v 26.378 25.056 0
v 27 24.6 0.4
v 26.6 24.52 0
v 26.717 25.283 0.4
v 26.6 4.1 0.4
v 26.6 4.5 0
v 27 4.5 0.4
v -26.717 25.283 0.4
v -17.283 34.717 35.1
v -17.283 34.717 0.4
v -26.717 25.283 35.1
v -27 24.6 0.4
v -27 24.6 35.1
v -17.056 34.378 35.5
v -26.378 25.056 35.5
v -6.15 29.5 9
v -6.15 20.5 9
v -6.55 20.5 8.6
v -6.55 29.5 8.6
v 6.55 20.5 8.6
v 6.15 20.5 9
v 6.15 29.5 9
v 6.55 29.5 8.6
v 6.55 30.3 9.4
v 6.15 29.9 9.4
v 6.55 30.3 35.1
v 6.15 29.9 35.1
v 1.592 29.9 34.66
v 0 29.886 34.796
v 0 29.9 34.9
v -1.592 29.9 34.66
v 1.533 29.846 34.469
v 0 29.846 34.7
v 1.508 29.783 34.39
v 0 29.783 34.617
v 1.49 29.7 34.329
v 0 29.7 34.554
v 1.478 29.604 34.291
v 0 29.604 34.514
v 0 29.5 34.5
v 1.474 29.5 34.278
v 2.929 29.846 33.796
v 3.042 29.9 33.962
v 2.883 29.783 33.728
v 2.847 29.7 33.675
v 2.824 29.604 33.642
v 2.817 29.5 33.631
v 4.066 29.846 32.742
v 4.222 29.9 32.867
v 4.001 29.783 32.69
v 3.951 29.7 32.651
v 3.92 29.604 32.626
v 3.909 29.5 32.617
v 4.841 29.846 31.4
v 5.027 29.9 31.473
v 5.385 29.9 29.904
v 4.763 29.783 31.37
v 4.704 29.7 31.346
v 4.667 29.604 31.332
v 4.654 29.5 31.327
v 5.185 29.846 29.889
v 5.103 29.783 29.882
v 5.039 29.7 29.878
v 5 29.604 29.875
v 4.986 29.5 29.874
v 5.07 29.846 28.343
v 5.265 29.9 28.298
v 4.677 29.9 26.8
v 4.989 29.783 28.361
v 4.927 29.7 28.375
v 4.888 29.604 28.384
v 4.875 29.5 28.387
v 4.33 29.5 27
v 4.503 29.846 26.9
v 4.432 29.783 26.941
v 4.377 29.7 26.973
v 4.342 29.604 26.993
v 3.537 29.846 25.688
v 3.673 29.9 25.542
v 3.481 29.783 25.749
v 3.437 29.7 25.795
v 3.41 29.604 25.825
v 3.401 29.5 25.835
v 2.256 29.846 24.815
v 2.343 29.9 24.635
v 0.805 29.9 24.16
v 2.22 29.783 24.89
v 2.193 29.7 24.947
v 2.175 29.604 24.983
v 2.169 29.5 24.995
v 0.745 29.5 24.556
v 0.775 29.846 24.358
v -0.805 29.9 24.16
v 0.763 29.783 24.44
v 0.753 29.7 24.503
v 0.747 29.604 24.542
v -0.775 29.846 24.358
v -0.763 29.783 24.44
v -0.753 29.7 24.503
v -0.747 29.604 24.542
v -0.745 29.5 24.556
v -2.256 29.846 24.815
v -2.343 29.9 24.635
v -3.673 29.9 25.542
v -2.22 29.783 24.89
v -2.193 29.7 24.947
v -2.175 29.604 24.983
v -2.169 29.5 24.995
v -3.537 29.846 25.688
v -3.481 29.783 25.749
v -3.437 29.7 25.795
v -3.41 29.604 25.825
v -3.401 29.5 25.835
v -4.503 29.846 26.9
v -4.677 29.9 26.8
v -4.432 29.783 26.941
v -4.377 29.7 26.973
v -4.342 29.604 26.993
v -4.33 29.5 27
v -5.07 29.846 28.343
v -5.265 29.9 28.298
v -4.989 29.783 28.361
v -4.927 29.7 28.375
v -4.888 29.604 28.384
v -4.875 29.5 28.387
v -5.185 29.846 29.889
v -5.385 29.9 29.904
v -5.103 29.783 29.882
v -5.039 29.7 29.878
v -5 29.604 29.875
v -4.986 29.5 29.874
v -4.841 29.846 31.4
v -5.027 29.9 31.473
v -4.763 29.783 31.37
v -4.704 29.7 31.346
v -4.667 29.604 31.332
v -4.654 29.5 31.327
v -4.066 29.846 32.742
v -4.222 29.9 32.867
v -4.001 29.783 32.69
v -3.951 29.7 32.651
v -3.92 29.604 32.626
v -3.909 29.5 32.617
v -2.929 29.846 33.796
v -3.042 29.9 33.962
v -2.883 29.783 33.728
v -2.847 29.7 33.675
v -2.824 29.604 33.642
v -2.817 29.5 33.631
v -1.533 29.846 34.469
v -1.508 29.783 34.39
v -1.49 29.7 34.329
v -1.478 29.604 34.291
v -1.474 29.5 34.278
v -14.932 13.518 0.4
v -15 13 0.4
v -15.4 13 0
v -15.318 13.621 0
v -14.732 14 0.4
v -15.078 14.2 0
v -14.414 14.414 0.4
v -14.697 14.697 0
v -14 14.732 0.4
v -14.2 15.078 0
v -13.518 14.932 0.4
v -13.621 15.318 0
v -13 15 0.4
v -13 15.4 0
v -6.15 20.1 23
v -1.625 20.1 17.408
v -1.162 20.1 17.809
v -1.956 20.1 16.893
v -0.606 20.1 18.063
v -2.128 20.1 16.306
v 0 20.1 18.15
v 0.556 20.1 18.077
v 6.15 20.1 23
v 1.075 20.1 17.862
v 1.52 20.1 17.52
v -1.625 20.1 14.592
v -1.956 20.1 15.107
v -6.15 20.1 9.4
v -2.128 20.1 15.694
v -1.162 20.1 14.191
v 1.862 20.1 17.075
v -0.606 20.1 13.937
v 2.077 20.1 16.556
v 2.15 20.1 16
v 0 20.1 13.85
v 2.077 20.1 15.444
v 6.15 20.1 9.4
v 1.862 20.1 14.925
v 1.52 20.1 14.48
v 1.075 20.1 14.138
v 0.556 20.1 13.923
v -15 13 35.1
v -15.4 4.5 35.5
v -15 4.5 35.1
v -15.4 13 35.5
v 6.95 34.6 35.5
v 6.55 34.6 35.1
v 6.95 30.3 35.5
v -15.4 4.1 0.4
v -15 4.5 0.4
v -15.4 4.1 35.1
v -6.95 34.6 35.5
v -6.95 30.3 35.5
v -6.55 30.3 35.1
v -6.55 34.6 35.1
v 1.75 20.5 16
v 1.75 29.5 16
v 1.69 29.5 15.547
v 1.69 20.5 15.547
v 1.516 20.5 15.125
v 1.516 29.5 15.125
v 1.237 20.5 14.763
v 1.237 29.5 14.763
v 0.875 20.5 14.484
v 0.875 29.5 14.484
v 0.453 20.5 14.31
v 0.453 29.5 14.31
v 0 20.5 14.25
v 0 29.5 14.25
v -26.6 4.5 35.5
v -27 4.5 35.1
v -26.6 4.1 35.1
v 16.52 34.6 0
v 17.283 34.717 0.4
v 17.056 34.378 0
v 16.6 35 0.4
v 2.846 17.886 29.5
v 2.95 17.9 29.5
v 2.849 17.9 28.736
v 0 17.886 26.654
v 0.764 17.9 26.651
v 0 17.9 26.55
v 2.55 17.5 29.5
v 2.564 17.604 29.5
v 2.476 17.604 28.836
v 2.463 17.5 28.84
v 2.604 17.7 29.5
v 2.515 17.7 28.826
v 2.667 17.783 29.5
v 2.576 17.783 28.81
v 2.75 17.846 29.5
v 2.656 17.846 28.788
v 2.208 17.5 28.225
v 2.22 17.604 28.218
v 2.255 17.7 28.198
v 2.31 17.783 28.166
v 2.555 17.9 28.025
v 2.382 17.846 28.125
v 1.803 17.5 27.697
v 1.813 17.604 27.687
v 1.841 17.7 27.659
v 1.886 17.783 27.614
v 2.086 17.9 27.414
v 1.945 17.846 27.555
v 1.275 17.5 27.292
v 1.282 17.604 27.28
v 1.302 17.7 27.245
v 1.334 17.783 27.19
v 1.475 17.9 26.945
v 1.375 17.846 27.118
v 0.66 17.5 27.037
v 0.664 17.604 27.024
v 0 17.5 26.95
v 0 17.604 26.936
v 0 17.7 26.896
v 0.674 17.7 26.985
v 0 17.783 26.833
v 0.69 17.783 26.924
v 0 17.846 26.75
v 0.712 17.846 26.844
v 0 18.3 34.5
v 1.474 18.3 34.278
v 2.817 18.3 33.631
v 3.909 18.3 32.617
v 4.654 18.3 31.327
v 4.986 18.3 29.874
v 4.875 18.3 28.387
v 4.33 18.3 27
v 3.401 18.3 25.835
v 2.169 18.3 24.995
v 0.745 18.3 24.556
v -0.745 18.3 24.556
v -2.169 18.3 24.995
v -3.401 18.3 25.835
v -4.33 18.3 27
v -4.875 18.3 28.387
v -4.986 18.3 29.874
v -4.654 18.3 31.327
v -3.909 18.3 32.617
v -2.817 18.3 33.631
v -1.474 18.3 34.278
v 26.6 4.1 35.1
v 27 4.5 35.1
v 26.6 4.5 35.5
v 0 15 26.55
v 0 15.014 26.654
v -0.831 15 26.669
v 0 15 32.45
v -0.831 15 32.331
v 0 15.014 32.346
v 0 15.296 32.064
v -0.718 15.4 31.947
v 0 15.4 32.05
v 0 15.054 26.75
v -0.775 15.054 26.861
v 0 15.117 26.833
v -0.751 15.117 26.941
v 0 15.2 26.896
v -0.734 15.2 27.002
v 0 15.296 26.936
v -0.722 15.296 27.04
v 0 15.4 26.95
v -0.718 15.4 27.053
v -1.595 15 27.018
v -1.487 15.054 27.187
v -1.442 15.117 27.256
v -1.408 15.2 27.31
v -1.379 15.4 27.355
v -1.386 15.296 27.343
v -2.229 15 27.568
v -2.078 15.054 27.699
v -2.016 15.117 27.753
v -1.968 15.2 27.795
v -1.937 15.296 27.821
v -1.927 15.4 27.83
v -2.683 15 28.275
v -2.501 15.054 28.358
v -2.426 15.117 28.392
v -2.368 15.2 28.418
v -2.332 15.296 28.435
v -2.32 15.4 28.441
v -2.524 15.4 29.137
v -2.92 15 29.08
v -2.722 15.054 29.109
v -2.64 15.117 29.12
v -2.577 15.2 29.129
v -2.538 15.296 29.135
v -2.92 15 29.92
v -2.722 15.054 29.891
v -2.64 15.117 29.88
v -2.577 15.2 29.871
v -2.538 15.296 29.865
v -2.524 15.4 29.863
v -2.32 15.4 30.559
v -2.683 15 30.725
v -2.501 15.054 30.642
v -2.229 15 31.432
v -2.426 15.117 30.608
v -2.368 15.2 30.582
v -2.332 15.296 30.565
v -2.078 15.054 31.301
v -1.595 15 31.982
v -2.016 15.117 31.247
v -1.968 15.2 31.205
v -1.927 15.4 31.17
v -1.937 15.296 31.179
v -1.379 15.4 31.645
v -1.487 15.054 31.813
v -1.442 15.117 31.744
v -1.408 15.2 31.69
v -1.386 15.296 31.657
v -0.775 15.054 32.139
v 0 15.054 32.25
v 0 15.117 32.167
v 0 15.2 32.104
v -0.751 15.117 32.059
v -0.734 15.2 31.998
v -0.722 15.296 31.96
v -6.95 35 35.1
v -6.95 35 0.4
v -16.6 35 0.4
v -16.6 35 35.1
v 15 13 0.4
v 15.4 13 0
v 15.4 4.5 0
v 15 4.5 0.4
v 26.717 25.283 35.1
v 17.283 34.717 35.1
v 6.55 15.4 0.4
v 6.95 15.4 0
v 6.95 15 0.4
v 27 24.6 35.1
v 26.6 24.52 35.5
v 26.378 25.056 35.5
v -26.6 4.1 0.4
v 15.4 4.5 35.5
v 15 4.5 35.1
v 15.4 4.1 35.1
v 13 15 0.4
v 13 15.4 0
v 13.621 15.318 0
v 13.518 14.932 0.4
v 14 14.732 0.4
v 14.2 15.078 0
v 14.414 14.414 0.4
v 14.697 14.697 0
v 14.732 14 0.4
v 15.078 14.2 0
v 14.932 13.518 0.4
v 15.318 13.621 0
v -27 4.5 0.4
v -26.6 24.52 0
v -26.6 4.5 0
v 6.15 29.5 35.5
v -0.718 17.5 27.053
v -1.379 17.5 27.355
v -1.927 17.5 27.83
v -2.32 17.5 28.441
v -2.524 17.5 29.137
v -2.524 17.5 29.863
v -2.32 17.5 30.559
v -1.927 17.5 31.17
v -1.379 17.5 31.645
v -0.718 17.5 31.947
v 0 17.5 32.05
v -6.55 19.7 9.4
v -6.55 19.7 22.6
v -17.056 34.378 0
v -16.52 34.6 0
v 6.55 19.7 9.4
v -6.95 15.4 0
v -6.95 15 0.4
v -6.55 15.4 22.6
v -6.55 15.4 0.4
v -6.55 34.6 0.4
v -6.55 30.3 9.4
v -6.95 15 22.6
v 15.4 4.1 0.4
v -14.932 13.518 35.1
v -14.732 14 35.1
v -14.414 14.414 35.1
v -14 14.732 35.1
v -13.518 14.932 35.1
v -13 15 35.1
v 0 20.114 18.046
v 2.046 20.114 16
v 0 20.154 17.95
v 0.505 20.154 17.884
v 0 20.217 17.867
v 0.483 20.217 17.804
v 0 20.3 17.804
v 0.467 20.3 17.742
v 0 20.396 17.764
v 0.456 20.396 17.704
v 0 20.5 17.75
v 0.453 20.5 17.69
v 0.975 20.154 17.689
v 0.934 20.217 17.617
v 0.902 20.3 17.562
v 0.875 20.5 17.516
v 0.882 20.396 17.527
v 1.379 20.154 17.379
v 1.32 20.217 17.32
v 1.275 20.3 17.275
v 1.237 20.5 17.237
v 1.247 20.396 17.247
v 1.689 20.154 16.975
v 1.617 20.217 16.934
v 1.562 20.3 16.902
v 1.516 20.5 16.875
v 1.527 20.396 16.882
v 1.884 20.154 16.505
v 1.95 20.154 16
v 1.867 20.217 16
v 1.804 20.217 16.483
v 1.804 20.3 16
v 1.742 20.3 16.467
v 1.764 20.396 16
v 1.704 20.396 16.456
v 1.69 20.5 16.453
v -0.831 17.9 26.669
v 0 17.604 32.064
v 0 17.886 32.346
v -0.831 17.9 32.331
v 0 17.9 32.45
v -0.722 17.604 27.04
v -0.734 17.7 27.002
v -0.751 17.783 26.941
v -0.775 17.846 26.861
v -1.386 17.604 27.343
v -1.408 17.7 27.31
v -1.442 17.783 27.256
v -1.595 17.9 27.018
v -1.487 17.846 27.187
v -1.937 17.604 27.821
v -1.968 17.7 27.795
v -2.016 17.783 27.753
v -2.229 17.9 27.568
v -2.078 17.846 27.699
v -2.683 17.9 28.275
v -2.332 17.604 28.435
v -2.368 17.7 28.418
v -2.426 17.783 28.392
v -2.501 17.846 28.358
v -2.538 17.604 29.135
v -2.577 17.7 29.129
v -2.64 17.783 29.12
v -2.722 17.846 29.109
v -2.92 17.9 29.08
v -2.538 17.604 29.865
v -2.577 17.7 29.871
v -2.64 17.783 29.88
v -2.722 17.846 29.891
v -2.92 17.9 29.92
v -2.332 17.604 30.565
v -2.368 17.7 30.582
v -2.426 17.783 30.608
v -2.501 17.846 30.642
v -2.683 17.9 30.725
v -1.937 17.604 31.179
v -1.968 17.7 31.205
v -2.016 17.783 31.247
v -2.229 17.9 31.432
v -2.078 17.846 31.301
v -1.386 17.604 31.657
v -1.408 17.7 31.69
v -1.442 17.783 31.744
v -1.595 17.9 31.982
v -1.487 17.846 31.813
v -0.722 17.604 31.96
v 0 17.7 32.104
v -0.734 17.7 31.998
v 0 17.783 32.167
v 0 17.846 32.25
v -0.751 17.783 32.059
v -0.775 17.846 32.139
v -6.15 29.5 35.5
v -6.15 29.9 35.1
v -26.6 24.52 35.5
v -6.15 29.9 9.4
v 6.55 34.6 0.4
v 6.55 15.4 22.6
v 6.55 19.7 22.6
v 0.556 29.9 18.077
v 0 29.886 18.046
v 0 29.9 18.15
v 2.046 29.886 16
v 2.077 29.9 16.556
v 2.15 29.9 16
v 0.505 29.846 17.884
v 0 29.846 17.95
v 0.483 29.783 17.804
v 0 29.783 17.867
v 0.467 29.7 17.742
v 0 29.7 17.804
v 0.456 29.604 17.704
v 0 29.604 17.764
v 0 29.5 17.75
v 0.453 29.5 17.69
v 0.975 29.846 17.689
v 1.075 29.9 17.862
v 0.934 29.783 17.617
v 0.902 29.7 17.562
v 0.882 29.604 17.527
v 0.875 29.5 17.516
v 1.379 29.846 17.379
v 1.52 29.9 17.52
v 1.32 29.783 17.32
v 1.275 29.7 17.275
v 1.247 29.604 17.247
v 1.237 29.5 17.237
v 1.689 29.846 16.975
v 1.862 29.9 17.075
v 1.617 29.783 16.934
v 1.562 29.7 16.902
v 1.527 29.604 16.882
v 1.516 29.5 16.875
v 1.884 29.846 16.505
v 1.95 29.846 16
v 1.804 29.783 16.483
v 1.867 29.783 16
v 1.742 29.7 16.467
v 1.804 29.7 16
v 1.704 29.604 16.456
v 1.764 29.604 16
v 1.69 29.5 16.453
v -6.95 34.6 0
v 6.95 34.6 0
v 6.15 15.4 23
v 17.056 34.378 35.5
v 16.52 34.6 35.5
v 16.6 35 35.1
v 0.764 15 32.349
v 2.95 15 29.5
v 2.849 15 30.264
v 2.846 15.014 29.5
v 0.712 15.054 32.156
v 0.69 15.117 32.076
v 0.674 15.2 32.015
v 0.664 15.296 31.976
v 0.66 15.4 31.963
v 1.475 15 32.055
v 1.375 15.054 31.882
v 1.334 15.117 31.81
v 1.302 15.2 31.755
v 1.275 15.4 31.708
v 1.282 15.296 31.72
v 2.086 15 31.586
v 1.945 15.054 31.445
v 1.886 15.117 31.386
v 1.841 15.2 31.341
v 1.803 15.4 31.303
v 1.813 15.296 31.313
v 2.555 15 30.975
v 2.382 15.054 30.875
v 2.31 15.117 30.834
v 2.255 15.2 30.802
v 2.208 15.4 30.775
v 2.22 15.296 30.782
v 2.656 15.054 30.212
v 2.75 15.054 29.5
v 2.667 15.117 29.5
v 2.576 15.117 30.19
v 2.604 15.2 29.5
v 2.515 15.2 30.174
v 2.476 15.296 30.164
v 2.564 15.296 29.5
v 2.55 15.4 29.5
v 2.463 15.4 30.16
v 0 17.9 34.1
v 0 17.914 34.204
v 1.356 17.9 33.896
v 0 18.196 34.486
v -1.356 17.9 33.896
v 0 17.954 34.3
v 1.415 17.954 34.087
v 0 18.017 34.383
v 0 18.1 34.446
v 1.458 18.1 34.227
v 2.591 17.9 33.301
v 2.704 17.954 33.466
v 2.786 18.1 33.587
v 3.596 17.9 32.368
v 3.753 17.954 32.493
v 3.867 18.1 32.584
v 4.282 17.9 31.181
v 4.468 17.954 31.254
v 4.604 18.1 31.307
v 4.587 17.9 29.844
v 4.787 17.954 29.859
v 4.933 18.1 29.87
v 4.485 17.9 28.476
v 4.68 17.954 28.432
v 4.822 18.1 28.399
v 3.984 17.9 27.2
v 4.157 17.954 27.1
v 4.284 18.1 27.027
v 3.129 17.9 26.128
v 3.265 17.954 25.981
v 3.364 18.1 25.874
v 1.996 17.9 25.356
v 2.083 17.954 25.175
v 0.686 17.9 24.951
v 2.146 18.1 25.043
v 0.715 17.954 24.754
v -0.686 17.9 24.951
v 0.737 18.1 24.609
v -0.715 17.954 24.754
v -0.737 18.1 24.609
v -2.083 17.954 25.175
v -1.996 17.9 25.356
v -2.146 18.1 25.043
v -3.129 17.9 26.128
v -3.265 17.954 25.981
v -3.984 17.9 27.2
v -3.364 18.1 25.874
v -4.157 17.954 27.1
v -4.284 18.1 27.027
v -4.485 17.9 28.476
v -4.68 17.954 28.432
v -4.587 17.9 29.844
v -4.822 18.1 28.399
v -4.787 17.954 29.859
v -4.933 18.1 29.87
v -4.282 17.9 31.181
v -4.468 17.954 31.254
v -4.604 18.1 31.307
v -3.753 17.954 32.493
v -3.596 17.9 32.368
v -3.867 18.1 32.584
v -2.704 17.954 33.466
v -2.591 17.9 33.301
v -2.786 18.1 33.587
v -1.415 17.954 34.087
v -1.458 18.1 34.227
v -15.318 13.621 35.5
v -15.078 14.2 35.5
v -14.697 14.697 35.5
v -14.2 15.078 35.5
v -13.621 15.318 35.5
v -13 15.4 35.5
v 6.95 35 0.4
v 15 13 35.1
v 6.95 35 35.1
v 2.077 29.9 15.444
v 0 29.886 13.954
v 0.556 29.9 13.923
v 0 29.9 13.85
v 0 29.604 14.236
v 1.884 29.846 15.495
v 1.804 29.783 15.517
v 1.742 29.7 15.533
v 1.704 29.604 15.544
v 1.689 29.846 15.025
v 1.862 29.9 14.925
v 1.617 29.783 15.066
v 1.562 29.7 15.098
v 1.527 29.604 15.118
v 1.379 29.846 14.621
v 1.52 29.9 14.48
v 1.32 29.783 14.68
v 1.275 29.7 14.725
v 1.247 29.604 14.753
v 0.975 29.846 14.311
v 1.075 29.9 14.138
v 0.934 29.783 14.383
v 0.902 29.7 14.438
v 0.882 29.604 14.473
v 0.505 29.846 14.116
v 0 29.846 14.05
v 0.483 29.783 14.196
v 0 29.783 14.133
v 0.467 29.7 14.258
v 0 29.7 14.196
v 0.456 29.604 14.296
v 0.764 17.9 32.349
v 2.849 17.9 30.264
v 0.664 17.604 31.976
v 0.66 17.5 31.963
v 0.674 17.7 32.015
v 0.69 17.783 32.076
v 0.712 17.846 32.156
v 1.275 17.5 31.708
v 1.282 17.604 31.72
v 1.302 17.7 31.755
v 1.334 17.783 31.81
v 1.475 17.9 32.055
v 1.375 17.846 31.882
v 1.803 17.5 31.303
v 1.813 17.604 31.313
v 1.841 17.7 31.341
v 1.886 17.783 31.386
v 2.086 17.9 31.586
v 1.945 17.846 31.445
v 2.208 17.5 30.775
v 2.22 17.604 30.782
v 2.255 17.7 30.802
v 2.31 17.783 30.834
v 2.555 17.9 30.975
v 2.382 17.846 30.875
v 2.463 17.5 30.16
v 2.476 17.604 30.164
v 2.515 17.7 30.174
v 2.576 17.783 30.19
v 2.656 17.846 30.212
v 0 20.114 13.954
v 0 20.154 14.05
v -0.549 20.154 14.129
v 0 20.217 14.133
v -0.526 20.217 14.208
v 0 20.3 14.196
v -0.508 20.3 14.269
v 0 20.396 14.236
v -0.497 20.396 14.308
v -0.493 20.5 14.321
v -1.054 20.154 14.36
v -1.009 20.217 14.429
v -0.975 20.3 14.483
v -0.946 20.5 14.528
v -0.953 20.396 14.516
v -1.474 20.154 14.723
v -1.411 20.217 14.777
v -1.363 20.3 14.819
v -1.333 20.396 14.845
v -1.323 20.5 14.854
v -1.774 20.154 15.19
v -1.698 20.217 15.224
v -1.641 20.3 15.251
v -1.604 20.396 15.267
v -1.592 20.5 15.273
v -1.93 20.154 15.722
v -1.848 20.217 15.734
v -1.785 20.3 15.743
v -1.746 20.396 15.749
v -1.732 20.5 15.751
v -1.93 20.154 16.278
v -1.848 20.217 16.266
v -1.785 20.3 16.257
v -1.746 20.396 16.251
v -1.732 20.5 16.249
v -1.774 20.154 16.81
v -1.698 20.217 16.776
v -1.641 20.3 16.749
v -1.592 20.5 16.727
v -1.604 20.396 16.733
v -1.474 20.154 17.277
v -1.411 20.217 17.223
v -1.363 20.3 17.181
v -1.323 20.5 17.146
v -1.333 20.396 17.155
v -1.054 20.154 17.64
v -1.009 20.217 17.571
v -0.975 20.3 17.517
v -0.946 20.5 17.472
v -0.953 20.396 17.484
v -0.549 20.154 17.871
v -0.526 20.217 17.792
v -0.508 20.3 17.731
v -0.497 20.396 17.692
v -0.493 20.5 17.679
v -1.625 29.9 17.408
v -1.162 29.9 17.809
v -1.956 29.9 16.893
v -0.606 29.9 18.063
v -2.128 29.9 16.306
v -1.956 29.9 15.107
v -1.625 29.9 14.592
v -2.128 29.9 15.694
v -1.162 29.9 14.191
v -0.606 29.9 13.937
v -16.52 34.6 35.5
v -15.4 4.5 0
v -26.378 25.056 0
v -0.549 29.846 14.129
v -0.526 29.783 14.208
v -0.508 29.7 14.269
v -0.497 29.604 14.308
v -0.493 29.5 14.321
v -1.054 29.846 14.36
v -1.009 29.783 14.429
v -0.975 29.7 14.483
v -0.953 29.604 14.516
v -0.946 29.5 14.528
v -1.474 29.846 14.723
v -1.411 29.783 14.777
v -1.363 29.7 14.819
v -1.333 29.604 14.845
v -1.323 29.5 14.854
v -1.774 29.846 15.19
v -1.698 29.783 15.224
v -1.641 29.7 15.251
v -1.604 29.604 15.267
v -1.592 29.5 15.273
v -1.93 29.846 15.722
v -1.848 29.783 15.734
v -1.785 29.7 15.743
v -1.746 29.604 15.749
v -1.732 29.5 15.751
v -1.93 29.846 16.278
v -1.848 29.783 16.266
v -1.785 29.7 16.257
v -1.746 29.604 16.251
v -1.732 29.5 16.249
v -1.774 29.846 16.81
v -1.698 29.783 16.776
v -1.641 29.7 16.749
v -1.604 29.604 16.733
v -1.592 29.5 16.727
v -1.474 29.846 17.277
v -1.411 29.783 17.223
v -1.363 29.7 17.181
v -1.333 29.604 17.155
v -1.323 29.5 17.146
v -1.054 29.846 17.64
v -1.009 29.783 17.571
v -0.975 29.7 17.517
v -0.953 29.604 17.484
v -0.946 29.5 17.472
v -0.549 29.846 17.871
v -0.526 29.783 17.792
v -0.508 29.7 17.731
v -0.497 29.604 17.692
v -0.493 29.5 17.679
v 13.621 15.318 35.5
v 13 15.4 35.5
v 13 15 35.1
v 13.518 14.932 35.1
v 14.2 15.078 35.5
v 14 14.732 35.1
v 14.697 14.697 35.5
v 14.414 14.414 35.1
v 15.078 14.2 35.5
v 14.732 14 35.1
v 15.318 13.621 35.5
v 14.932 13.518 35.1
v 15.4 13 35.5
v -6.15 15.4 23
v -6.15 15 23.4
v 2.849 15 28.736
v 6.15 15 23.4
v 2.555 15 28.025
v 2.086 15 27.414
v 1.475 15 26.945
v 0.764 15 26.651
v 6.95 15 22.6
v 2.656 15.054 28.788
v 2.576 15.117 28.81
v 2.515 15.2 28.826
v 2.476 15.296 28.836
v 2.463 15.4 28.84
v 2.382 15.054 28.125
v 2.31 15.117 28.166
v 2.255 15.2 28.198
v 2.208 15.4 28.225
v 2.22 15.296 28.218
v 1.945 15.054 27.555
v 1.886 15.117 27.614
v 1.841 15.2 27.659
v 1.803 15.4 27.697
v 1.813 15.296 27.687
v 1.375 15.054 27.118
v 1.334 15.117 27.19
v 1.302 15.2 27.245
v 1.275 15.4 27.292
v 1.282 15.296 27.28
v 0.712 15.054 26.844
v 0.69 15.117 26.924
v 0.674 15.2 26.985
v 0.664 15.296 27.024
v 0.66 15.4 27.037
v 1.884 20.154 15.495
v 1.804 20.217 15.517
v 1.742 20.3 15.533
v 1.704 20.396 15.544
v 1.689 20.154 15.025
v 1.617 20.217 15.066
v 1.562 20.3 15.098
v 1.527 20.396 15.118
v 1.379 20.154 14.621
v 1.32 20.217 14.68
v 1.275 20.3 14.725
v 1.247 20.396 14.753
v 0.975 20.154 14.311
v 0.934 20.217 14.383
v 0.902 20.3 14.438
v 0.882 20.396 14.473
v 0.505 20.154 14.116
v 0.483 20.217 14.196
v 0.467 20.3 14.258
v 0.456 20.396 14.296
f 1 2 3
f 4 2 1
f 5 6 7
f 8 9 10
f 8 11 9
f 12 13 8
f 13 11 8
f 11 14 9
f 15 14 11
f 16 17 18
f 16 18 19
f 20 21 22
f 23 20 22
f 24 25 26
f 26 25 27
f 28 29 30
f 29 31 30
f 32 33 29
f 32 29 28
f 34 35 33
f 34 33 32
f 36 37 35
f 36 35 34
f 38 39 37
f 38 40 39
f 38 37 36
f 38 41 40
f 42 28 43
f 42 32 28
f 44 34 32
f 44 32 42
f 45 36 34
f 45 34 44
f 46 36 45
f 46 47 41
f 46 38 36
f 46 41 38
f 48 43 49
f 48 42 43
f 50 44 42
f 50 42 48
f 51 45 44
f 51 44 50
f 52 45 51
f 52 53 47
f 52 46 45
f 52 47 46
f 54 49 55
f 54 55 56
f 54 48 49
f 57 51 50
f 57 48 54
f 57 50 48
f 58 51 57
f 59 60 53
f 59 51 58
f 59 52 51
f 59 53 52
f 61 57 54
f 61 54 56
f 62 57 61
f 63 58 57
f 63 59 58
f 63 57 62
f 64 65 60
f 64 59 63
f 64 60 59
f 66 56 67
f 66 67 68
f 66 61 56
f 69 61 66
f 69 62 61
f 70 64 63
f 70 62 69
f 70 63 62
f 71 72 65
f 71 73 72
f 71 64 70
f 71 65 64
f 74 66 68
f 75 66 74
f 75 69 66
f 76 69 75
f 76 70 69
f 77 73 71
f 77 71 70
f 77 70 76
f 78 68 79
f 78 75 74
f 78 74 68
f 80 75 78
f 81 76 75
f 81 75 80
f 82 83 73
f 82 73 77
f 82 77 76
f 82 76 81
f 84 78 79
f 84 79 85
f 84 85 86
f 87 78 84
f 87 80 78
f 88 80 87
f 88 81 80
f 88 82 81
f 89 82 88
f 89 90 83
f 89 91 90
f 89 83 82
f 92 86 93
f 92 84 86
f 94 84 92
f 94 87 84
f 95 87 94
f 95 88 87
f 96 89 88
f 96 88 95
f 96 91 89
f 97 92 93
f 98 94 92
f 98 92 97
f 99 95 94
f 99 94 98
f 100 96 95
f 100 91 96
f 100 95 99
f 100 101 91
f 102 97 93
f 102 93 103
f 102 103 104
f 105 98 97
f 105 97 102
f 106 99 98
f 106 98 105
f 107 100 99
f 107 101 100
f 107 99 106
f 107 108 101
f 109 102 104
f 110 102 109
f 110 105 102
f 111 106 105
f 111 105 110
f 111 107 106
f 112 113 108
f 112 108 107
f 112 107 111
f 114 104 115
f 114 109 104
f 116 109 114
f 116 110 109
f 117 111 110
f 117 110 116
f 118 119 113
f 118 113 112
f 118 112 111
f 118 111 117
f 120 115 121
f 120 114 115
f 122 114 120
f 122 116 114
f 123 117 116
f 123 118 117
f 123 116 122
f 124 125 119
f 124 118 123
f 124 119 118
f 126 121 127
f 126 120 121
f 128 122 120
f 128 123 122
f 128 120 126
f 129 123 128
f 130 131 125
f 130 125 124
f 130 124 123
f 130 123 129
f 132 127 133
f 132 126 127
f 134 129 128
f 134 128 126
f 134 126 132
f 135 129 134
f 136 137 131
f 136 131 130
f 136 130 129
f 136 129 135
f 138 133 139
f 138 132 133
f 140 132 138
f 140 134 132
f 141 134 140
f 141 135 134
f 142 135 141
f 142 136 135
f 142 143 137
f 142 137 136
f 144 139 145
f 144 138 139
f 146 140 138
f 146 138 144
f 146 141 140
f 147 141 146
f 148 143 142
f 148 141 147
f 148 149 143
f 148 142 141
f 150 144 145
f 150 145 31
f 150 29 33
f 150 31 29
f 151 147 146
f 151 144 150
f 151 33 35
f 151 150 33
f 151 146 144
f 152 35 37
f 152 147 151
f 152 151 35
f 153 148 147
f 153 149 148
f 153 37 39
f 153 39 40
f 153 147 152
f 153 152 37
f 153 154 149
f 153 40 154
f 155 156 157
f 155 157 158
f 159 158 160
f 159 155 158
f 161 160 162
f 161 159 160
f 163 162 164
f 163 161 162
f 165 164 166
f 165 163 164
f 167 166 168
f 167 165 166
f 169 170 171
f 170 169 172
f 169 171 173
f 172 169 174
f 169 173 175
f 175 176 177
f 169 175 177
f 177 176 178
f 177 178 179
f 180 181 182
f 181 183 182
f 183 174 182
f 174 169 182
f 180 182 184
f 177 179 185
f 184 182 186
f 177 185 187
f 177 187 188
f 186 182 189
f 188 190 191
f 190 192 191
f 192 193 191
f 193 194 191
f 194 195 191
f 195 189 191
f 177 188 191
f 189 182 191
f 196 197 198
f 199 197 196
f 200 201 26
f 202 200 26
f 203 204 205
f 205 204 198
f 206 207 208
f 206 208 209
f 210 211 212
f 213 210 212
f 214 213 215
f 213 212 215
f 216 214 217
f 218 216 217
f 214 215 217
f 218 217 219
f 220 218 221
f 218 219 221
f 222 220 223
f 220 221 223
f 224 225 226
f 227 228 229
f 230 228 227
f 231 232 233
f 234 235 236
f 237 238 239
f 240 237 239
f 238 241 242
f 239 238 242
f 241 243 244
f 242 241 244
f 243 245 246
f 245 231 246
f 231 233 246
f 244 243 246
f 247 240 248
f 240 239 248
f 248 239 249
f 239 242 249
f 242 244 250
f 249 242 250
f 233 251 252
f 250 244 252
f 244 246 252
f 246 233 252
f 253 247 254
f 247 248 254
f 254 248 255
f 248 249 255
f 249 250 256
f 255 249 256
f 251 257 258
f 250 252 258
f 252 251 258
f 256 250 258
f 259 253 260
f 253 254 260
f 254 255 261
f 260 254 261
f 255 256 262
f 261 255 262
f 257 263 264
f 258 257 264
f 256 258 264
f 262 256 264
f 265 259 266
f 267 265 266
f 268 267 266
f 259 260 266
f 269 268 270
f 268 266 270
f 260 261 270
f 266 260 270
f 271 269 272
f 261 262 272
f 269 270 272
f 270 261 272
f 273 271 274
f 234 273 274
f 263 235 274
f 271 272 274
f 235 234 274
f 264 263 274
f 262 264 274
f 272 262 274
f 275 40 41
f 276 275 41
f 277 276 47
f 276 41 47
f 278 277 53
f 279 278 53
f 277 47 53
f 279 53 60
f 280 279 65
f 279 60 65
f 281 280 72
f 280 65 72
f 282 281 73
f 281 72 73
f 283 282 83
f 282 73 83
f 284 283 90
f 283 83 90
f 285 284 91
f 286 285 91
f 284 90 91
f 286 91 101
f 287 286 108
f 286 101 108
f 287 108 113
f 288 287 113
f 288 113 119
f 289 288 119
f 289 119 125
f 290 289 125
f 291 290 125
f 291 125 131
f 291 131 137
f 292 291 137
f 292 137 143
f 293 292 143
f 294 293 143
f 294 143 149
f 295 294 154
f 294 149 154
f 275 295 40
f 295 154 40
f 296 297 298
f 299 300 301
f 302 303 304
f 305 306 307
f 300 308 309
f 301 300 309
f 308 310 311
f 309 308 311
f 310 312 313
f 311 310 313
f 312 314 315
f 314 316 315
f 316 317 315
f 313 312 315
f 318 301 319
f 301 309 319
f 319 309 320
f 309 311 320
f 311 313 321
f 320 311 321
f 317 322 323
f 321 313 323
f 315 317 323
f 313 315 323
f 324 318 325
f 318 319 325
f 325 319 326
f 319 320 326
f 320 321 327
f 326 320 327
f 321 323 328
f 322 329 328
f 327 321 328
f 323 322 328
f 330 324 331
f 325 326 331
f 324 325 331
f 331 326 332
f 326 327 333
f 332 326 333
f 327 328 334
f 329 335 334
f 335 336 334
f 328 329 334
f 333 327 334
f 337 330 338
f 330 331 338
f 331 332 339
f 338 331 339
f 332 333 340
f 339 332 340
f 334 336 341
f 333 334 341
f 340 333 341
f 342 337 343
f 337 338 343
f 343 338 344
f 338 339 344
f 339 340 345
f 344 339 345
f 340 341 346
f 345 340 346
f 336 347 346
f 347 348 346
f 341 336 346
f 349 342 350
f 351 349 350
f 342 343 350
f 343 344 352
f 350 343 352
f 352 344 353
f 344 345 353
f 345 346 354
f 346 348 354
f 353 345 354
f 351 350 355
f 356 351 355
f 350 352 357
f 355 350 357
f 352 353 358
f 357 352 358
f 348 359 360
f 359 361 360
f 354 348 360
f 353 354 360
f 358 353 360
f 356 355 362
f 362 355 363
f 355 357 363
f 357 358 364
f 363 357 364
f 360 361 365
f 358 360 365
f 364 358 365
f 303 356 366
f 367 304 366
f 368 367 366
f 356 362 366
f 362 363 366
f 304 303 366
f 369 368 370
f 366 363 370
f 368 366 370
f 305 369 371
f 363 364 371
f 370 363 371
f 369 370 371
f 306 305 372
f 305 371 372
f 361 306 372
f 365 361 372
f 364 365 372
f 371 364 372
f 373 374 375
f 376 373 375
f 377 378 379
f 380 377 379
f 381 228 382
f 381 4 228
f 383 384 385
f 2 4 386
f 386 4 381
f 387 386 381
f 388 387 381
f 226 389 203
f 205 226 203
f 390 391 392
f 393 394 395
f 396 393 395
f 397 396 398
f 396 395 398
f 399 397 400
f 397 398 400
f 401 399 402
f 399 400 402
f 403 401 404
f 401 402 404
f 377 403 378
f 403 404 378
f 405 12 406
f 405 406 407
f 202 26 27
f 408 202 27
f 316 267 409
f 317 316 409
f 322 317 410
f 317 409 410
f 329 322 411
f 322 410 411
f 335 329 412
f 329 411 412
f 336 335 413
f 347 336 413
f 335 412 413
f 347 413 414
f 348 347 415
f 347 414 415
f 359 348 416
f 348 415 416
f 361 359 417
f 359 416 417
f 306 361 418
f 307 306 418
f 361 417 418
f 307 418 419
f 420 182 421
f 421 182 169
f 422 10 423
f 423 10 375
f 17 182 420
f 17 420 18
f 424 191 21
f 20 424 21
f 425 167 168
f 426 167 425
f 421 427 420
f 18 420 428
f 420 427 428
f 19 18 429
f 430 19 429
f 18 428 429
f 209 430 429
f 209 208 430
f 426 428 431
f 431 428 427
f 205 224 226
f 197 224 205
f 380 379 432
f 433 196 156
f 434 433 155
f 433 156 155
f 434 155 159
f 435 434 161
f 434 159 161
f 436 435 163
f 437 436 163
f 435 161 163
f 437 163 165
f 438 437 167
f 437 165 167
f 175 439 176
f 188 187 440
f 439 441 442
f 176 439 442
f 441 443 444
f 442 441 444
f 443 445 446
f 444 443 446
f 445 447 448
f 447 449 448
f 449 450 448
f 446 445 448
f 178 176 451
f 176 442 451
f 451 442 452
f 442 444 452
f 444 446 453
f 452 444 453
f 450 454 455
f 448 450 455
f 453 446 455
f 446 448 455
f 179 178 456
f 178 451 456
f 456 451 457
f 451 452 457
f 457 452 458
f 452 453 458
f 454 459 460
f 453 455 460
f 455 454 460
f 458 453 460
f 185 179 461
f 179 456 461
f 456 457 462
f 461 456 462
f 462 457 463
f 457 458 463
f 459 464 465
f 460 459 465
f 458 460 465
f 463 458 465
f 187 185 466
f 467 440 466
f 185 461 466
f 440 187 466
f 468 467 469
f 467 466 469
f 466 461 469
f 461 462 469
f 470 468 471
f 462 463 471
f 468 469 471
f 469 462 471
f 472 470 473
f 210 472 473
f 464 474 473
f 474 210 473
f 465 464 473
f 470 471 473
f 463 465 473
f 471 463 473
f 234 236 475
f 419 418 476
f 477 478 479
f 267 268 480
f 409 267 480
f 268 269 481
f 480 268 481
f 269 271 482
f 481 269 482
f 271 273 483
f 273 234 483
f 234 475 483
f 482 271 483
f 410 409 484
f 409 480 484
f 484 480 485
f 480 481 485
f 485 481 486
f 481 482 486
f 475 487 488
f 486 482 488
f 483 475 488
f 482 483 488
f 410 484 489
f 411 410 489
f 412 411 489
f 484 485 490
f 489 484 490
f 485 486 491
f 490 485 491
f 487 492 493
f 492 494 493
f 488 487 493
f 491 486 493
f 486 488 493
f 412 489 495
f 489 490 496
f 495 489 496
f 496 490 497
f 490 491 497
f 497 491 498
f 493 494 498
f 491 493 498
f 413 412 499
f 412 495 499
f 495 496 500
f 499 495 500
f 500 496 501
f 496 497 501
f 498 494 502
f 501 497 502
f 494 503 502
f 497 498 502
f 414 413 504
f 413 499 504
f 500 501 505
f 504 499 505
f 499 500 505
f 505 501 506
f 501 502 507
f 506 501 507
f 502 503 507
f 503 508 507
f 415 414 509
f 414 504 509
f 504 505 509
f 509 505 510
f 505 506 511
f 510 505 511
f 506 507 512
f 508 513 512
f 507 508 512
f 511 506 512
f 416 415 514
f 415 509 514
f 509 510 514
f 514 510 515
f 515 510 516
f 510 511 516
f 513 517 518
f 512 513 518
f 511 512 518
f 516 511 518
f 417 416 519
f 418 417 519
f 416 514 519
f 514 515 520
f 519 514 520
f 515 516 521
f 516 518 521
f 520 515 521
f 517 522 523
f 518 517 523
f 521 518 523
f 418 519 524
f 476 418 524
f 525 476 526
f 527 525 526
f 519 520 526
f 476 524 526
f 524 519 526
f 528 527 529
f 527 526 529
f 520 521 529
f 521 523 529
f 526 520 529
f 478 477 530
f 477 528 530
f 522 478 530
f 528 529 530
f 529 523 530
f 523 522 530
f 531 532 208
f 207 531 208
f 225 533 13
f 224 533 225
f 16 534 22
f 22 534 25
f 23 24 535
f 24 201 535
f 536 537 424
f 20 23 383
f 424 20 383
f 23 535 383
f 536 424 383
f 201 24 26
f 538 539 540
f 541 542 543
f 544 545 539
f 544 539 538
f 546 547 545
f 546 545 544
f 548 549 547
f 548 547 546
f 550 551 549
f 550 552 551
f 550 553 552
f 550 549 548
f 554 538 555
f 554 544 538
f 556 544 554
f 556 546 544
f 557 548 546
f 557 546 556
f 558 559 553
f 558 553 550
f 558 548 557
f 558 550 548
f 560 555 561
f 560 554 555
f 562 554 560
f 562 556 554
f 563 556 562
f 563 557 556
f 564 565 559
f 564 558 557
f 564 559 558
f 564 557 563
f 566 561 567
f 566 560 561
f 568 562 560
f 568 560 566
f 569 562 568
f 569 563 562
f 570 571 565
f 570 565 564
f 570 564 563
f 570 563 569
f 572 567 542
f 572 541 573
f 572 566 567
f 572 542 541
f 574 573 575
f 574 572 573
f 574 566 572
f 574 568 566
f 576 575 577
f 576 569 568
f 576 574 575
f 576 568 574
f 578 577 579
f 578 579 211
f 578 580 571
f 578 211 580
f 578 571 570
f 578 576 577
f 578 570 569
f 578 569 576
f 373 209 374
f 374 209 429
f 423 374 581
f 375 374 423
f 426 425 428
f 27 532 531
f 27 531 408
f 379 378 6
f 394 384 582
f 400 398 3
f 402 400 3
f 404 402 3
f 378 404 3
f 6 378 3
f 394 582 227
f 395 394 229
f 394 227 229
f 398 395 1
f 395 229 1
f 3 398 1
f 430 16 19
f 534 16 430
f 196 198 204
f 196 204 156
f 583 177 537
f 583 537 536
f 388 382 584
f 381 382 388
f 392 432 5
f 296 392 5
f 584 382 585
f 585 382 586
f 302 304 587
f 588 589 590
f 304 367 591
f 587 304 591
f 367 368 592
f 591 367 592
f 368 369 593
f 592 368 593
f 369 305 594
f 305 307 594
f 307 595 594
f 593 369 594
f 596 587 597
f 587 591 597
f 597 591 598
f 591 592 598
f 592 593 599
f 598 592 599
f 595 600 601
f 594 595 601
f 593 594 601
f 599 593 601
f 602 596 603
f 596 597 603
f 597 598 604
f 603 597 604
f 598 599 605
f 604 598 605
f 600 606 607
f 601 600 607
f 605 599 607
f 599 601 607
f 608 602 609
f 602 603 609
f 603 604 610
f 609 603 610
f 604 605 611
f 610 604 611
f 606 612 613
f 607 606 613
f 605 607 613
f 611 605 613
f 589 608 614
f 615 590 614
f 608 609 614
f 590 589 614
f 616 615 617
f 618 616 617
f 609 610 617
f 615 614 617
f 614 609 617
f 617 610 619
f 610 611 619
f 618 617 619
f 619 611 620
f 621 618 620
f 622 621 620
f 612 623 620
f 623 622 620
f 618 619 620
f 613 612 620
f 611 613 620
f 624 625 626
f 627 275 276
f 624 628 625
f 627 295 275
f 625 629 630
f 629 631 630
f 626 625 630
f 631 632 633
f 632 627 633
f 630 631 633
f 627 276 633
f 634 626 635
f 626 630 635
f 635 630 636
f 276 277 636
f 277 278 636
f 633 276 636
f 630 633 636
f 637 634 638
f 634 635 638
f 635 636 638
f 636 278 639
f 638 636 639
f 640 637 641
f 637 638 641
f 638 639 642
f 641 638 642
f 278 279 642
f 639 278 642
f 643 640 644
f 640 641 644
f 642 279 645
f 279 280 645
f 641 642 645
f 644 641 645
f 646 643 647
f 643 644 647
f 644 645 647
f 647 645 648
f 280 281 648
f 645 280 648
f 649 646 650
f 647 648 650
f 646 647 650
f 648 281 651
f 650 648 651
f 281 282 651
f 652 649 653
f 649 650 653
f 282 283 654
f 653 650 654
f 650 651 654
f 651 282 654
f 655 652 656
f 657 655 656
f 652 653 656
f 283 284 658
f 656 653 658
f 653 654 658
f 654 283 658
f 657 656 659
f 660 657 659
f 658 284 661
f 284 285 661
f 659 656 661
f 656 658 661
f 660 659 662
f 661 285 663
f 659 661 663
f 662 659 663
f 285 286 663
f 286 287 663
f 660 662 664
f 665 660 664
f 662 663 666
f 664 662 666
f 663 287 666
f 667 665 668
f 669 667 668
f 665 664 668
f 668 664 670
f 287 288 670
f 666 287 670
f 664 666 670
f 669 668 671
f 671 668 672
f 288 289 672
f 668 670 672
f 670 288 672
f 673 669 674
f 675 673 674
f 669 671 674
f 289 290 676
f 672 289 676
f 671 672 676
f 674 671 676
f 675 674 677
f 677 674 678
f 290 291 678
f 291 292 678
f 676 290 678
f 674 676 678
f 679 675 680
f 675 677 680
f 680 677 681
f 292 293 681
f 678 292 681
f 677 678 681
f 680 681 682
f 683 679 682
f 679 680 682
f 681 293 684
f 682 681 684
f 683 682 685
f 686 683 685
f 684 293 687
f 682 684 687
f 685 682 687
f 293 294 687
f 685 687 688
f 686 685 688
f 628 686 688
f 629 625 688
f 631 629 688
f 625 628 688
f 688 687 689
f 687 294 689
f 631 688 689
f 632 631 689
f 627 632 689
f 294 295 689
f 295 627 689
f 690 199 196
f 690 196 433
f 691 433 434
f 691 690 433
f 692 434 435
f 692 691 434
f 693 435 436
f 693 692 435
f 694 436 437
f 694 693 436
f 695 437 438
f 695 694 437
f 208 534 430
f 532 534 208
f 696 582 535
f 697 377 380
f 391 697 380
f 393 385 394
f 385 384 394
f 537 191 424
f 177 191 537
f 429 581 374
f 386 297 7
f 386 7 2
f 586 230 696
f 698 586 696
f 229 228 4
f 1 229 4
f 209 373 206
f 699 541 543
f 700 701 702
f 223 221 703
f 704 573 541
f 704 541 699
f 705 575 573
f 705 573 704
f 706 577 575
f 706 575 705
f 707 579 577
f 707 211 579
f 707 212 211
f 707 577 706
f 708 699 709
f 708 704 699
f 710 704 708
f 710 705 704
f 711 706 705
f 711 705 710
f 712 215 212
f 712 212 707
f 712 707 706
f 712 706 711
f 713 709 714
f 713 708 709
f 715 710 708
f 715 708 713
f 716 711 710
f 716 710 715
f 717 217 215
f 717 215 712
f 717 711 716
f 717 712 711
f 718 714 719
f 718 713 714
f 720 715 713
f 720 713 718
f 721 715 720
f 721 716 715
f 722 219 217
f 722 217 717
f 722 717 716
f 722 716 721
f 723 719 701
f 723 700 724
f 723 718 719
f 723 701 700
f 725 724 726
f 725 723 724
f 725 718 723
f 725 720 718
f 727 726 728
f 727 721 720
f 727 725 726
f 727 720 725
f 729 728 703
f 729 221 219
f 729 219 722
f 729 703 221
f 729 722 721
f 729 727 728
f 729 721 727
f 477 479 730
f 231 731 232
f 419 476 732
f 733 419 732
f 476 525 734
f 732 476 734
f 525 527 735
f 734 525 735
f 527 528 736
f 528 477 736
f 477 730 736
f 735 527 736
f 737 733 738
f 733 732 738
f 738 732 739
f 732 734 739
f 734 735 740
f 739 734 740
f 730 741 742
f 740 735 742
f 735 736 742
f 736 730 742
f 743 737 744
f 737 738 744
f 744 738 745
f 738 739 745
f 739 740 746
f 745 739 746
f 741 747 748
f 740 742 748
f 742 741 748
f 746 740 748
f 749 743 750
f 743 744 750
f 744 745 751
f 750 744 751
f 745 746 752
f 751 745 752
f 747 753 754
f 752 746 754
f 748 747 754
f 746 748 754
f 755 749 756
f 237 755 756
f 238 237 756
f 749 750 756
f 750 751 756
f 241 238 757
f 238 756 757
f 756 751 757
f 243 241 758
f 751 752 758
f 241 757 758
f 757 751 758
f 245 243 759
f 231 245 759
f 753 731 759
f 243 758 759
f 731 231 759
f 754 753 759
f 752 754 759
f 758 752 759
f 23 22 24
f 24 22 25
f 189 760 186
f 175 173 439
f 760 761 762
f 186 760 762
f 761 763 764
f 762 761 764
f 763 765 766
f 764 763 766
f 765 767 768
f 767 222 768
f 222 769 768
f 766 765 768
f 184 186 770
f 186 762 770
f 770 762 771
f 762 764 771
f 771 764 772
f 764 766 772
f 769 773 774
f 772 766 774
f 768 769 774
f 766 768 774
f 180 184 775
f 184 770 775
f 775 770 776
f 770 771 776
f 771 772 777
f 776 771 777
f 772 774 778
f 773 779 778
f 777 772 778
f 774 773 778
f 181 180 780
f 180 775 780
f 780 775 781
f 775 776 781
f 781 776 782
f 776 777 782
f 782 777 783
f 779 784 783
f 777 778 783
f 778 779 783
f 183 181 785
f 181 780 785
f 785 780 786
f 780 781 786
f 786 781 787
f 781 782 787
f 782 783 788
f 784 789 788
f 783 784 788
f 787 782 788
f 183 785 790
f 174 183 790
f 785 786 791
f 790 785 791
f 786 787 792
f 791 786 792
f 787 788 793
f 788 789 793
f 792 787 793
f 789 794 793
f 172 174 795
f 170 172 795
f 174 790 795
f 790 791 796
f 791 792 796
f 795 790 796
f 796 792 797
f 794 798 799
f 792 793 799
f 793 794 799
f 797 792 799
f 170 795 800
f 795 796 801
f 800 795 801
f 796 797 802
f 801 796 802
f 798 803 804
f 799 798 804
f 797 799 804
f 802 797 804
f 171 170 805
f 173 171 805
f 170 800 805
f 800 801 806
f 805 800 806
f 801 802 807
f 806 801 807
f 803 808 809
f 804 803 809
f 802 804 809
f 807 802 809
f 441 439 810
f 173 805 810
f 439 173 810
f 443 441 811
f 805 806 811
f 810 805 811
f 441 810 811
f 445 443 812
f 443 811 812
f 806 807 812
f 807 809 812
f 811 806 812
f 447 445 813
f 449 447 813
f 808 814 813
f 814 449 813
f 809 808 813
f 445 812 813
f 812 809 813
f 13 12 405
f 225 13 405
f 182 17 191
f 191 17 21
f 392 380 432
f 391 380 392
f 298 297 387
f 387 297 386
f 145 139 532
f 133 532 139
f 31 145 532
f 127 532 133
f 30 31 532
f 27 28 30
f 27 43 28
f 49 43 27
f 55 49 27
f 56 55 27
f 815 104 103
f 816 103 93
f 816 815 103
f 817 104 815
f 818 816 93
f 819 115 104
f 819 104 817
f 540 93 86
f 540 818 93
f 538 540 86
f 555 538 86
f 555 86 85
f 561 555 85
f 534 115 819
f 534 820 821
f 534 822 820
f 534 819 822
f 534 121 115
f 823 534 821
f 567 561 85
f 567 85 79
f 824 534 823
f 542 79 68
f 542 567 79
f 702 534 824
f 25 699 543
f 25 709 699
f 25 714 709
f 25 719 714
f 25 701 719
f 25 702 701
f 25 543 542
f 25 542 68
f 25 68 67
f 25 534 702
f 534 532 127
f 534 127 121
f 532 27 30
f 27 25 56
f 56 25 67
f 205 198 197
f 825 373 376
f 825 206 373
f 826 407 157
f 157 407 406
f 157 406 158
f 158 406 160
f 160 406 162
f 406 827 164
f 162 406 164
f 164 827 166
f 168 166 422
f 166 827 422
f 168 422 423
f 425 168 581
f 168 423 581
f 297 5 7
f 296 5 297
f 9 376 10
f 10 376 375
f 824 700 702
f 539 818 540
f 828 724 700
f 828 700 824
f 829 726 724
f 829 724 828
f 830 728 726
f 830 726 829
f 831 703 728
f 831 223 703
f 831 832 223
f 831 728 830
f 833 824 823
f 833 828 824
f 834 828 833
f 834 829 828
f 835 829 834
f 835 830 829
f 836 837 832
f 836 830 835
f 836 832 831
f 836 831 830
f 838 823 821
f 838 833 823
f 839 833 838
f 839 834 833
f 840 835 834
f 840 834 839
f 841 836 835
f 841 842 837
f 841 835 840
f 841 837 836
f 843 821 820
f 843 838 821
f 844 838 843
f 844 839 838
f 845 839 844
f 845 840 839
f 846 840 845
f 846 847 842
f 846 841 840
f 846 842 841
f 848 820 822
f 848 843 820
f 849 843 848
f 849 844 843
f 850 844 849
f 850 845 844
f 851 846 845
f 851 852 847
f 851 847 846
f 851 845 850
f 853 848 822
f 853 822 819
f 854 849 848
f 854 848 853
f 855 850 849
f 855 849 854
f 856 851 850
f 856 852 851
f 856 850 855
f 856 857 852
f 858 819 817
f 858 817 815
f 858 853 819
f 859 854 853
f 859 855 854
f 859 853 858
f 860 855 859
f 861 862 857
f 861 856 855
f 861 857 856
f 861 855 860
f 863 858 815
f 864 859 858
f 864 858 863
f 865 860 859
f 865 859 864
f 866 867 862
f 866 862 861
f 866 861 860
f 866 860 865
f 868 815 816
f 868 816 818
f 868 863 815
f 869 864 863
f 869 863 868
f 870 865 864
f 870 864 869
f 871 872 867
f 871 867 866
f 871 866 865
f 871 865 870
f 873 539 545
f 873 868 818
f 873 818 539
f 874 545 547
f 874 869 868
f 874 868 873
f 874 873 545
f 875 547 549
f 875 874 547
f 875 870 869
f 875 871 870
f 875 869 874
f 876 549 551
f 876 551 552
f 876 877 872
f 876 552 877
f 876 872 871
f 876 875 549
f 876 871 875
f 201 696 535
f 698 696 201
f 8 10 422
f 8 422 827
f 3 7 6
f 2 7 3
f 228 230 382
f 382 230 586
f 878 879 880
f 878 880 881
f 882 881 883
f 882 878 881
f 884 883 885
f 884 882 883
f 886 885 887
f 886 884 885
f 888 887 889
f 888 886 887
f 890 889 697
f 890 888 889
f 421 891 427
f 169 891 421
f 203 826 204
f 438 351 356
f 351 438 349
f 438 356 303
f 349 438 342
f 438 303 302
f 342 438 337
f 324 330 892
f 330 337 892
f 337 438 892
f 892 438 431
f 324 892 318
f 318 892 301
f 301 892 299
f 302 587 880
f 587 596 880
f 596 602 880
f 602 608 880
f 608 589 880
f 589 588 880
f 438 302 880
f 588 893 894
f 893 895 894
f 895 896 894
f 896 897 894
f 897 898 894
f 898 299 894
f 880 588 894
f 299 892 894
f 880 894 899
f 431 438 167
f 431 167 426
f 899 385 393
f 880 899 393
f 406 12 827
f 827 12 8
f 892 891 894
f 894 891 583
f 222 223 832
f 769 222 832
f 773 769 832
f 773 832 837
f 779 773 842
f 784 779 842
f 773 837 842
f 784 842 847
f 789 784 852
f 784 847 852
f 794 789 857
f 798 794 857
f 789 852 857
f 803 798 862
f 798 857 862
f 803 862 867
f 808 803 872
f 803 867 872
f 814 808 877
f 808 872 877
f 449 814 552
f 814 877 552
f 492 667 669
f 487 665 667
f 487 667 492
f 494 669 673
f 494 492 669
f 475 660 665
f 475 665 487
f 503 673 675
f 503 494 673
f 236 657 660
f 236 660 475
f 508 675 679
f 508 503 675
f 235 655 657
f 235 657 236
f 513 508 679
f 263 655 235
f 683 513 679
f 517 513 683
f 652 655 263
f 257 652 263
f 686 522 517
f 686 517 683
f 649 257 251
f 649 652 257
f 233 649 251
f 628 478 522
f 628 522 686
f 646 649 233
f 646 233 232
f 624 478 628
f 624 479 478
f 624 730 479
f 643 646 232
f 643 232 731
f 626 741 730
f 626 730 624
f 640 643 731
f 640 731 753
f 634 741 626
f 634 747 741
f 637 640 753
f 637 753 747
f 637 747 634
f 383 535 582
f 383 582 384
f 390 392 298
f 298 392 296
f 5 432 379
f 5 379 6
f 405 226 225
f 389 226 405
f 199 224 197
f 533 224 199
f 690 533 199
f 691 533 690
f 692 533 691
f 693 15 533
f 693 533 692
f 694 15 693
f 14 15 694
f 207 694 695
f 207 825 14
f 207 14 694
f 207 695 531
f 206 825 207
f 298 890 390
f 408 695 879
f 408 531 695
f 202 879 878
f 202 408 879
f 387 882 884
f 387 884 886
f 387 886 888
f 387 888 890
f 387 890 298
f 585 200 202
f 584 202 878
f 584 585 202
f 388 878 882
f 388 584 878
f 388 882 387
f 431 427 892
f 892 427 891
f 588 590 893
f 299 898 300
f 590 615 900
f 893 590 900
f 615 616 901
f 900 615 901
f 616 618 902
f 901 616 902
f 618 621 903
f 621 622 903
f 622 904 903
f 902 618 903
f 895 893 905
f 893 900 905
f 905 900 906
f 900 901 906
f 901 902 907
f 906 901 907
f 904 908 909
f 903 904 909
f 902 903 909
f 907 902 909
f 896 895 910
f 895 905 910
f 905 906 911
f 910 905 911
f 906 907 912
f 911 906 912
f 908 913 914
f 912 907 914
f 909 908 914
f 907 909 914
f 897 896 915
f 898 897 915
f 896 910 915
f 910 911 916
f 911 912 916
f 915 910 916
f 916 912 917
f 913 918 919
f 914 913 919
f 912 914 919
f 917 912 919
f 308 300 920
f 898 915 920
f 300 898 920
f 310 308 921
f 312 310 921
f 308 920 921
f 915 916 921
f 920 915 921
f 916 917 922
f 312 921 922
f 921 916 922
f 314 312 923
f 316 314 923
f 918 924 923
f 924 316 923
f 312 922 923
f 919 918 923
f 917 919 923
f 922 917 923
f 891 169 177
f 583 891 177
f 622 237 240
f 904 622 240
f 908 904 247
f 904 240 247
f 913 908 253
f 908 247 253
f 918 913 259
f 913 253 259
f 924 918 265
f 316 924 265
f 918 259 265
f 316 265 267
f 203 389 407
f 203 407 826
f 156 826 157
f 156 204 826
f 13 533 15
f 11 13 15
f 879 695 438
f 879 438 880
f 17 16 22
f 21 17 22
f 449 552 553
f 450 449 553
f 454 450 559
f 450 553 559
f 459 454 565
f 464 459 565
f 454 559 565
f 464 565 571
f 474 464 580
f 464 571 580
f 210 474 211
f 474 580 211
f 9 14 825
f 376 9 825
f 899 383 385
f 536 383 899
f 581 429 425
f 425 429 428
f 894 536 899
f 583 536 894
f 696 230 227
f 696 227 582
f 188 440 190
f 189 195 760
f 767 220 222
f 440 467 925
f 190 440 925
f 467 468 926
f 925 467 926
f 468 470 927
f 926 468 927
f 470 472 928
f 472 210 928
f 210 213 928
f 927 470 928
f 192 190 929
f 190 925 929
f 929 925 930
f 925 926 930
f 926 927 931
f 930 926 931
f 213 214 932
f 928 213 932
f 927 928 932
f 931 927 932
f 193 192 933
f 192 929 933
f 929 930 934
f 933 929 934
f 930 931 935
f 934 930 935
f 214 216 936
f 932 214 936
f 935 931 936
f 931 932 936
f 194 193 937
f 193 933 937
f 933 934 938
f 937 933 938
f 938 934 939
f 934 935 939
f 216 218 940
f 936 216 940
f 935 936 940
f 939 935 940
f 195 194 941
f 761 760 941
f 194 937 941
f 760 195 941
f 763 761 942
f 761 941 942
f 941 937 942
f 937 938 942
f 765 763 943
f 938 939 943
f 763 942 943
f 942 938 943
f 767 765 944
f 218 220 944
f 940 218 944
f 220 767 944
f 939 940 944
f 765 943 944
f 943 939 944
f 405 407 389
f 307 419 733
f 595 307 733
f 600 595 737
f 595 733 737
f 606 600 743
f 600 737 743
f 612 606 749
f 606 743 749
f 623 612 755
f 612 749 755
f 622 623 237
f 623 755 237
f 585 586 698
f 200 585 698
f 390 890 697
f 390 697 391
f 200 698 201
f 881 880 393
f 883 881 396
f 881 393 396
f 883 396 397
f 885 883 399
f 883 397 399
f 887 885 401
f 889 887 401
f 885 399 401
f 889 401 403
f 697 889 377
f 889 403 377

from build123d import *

# Parameters (mm, degrees)
BOSS_EXTRUDE1_DEPTH = 23
BOSS_EXTRUDE5_START = 23
SKETCH1_9_W         = 13.1
SKETCH1_9_H         = 9.8
SKETCH1_9_H_2       = 5.1
BOSS_EXTRUDE5_DEPTH = 12.5
SKETCH1_4_W         = 13.1
SKETCH1_4_H         = 9.8
CUT_EXTRUDE1_DEPTH  = 9
CHAMFER4_SIZE       = 10
CHAMFER6_SIZE       = 0.4
CUT_EXTRUDE5_DEPTH  = 52.525624693
SKETCH6_4_R         = 1.75
SKETCH6_4_R_2       = 5
SKETCH6_4_R_3       = 2.55
CUT_EXTRUDE6_DEPTH  = 12
CHAMFER7_SIZE       = 0.4
FILLET1_R           = 0.4


with BuildPart() as part:
    # Sketch1 → Boss-Extrude1 (new body)
    with BuildSketch(Plane.XY):
        with BuildLine():
            Line((-27, 4.1), (-15, 4.1))
            Line((-15, 4.1), (-15, 13))
            ThreePointArc((-15, 13), (-14.414213562, 14.414213562), (-13, 15))
            Line((-13, 15), (-6.55, 15))
            Line((-6.55, 15), (-6.55, 20.1))
            Line((-6.55, 20.1), (6.55, 20.1))
            Line((6.55, 20.1), (6.55, 15))
            Line((6.55, 15), (13, 15))
            ThreePointArc((13, 15), (14.414213562, 14.414213562), (15, 13))
            Line((15, 13), (15, 4.1))
            Line((15, 4.1), (27, 4.1))
            Line((27, 4.1), (27, 35))
            Line((27, 35), (6.55, 35))
            Line((6.55, 35), (6.55, 29.9))
            Line((6.55, 29.9), (-6.55, 29.9))
            Line((-6.55, 29.9), (-6.55, 35))
            Line((-6.55, 35), (-27, 35))
            Line((-27, 35), (-27, 4.1))
        make_face()
    extrude(amount=BOSS_EXTRUDE1_DEPTH)

    # Sketch1<9> → Boss-Extrude5 (add)
    with BuildSketch(Plane.XY.offset(BOSS_EXTRUDE5_START)):
        with BuildLine():
            Line((-27, 4.1), (-15, 4.1))
            Line((-15, 4.1), (-15, 13))
            ThreePointArc((-15, 13), (-14.414213562, 14.414213562), (-13, 15))
            Line((-13, 15), (-6.55, 15))
            Line((-6.55, 15), (-6.55, 20.1))
            Line((-6.55, 20.1), (-6.55, 29.9))
            Line((-6.55, 29.9), (-6.55, 35))
            Line((-6.55, 35), (-27, 35))
            Line((-27, 35), (-27, 4.1))
        make_face()
        with Locations((0, 25)):
            Rectangle(SKETCH1_9_W, SKETCH1_9_H)
        with BuildLine():
            Line((6.55, 20.1), (6.55, 15))
            Line((6.55, 15), (13, 15))
            ThreePointArc((13, 15), (14.414213562, 14.414213562), (15, 13))
            Line((15, 13), (15, 4.1))
            Line((15, 4.1), (27, 4.1))
            Line((27, 4.1), (27, 35))
            Line((27, 35), (6.55, 35))
            Line((6.55, 35), (6.55, 29.9))
            Line((6.55, 29.9), (6.55, 20.1))
        make_face()
        with Locations((0, 17.55)):
            Rectangle(SKETCH1_9_W, SKETCH1_9_H_2)
    extrude(amount=BOSS_EXTRUDE5_DEPTH)

    # Sketch1<4> → Cut-Extrude1 (cut)
    with BuildSketch(Plane.XY):
        with Locations((0, 25)):
            Rectangle(SKETCH1_4_W, SKETCH1_4_H)
    extrude(amount=CUT_EXTRUDE1_DEPTH, mode=Mode.SUBTRACT)

    # Chamfer4
    chamfer4_edges = [part.edges().sort_by_distance(p)[0] for p in [
        (-27, 35, 17.75),
        (27, 35, 17.75),
    ]]
    chamfer(chamfer4_edges, length=CHAMFER4_SIZE)

    # Chamfer6
    chamfer6_edges = [part.edges().sort_by_distance(p)[0] for p in [
        (17, 35, 17.75),
        (27, 25, 17.75),
        (-27, 25, 17.75),
        (-17, 35, 17.75),
    ]]
    chamfer(chamfer6_edges, length=CHAMFER6_SIZE)

    # Sketch6 → Cut-Extrude5 (cut, through all)
    with BuildSketch(Plane(origin=(0, 29.9, 0), x_dir=(1, 0, 0), z_dir=(0, 1, 0))):
        with BuildLine():
            ThreePointArc((1.75, -16), (1.237436867, -14.762563133), (0, -14.25))
            Line((0, -14.25), (0, -17.75))
            ThreePointArc((0, -17.75), (1.237436867, -17.237436867), (1.75, -16))
        make_face()
        with BuildLine():
            Line((0, -17.75), (0, -14.25))
            ThreePointArc((0, -14.25), (-1.75, -16), (0, -17.75))
        make_face()
        with BuildLine():
            ThreePointArc((2.55, -29.5), (1.803122292, -27.696877708), (0, -26.95))
            Line((0, -26.95), (0, -32.05))
            ThreePointArc((0, -32.05), (1.803122292, -31.303122292), (2.55, -29.5))
        make_face()
        with BuildLine():
            Line((0, -32.05), (0, -26.95))
            ThreePointArc((0, -26.95), (-2.55, -29.5), (0, -32.05))
        make_face()
    extrude(amount=-CUT_EXTRUDE5_DEPTH, mode=Mode.SUBTRACT)

    # Sketch6<4> → Cut-Extrude6 (cut)
    # profile 1 of 2: a face of its own
    with BuildSketch(Plane(origin=(0, 29.9, 0), x_dir=(1, 0, 0), z_dir=(0, 1, 0))):
        with Locations(Location((0, -16, 0), (0, 0, 270))):
            Circle(SKETCH6_4_R)
    # profile 2 of 2: a face of its own
    with BuildSketch(Plane(origin=(0, 29.9, 0), x_dir=(1, 0, 0), z_dir=(0, 1, 0))):
        with Locations(Location((0, -29.5, 0), (0, 0, 270))):
            Circle(SKETCH6_4_R_2)
        with Locations(Location((0, -29.5, 0), (0, 0, 270))):
            Circle(SKETCH6_4_R_3, mode=Mode.SUBTRACT)
    extrude(amount=-CUT_EXTRUDE6_DEPTH, mode=Mode.SUBTRACT)

    # Chamfer7
    chamfer7_edges = [part.edges().sort_by_distance(p)[0] for p in [
        (0, 29.9, 9),
        (6.55, 25, 9),
        (-6.55, 25, 9),
        (0, 20.1, 9),
        (-27, 14.35, 0),
        (-22, 30, 0),
        (-16.941421356, 34.858578644, 0),
        (-26.858578644, 24.941421356, 0),
        (-22, 30, 35.5),
        (27, 14.35, 35.5),
        (22, 30, 35.5),
        (-11.575, 35, 35.5),
        (26.858578644, 24.941421356, 35.5),
        (16.941421356, 34.858578644, 35.5),
        (-16.941421356, 34.858578644, 35.5),
        (-26.858578644, 24.941421356, 35.5),
        (11.575, 35, 0),
        (22, 30, 0),
        (26.858578644, 24.941421356, 0),
        (16.941421356, 34.858578644, 0),
        (9.775, 15, 0),
        (6.55, 25, 0),
        (-6.55, 25, 0),
        (-9.775, 15, 0),
        (-14.414213562, 14.414213562, 0),
        (-15, 8.55, 0),
        (-21, 4.1, 0),
        (-11.575, 35, 0),
        (27, 14.35, 0),
        (21, 4.1, 0),
        (15, 8.55, 0),
        (14.414213562, 14.414213562, 0),
        (6.55, 15, 11.5),
        (6.55, 20.1, 16),
        (-6.55, 20.1, 16),
        (-6.55, 15, 11.5),
        (-15, 4.1, 17.75),
        (-27, 4.1, 17.75),
        (-6.55, 35, 17.75),
        (-6.55, 29.9, 22.25),
        (6.55, 29.9, 22.25),
        (6.55, 35, 17.75),
        (27, 4.1, 17.75),
        (15, 4.1, 17.75),
        (-15, 8.55, 35.5),
        (-14.414213562, 14.414213562, 35.5),
        (0, 15, 35.5),
        (14.414213562, 14.414213562, 35.5),
        (15, 8.55, 35.5),
        (21, 4.1, 35.5),
        (11.575, 35, 35.5),
        (6.55, 32.45, 35.5),
        (-27, 14.35, 35.5),
        (0, 29.9, 35.5),
        (-6.55, 32.45, 35.5),
        (-21, 4.1, 35.5),
        (0, 15, 23),
        (-6.55, 17.55, 23),
        (6.55, 17.55, 23),
    ]]
    chamfer(chamfer7_edges, length=CHAMFER7_SIZE)

    # Fillet1
    fillet1_edges = [part.edges().sort_by_distance(p)[0] for p in [
        (0, 20.1, 14.25),
        (0, 29.9, 14.25),
        (0, 15, 32.05),
        (0, 17.9, 24.5),
        (0, 17.9, 32.05),
        (0, 29.9, 24.5),
    ]]
    fillet(fillet1_edges, radius=FILLET1_R)


solid = part.part
